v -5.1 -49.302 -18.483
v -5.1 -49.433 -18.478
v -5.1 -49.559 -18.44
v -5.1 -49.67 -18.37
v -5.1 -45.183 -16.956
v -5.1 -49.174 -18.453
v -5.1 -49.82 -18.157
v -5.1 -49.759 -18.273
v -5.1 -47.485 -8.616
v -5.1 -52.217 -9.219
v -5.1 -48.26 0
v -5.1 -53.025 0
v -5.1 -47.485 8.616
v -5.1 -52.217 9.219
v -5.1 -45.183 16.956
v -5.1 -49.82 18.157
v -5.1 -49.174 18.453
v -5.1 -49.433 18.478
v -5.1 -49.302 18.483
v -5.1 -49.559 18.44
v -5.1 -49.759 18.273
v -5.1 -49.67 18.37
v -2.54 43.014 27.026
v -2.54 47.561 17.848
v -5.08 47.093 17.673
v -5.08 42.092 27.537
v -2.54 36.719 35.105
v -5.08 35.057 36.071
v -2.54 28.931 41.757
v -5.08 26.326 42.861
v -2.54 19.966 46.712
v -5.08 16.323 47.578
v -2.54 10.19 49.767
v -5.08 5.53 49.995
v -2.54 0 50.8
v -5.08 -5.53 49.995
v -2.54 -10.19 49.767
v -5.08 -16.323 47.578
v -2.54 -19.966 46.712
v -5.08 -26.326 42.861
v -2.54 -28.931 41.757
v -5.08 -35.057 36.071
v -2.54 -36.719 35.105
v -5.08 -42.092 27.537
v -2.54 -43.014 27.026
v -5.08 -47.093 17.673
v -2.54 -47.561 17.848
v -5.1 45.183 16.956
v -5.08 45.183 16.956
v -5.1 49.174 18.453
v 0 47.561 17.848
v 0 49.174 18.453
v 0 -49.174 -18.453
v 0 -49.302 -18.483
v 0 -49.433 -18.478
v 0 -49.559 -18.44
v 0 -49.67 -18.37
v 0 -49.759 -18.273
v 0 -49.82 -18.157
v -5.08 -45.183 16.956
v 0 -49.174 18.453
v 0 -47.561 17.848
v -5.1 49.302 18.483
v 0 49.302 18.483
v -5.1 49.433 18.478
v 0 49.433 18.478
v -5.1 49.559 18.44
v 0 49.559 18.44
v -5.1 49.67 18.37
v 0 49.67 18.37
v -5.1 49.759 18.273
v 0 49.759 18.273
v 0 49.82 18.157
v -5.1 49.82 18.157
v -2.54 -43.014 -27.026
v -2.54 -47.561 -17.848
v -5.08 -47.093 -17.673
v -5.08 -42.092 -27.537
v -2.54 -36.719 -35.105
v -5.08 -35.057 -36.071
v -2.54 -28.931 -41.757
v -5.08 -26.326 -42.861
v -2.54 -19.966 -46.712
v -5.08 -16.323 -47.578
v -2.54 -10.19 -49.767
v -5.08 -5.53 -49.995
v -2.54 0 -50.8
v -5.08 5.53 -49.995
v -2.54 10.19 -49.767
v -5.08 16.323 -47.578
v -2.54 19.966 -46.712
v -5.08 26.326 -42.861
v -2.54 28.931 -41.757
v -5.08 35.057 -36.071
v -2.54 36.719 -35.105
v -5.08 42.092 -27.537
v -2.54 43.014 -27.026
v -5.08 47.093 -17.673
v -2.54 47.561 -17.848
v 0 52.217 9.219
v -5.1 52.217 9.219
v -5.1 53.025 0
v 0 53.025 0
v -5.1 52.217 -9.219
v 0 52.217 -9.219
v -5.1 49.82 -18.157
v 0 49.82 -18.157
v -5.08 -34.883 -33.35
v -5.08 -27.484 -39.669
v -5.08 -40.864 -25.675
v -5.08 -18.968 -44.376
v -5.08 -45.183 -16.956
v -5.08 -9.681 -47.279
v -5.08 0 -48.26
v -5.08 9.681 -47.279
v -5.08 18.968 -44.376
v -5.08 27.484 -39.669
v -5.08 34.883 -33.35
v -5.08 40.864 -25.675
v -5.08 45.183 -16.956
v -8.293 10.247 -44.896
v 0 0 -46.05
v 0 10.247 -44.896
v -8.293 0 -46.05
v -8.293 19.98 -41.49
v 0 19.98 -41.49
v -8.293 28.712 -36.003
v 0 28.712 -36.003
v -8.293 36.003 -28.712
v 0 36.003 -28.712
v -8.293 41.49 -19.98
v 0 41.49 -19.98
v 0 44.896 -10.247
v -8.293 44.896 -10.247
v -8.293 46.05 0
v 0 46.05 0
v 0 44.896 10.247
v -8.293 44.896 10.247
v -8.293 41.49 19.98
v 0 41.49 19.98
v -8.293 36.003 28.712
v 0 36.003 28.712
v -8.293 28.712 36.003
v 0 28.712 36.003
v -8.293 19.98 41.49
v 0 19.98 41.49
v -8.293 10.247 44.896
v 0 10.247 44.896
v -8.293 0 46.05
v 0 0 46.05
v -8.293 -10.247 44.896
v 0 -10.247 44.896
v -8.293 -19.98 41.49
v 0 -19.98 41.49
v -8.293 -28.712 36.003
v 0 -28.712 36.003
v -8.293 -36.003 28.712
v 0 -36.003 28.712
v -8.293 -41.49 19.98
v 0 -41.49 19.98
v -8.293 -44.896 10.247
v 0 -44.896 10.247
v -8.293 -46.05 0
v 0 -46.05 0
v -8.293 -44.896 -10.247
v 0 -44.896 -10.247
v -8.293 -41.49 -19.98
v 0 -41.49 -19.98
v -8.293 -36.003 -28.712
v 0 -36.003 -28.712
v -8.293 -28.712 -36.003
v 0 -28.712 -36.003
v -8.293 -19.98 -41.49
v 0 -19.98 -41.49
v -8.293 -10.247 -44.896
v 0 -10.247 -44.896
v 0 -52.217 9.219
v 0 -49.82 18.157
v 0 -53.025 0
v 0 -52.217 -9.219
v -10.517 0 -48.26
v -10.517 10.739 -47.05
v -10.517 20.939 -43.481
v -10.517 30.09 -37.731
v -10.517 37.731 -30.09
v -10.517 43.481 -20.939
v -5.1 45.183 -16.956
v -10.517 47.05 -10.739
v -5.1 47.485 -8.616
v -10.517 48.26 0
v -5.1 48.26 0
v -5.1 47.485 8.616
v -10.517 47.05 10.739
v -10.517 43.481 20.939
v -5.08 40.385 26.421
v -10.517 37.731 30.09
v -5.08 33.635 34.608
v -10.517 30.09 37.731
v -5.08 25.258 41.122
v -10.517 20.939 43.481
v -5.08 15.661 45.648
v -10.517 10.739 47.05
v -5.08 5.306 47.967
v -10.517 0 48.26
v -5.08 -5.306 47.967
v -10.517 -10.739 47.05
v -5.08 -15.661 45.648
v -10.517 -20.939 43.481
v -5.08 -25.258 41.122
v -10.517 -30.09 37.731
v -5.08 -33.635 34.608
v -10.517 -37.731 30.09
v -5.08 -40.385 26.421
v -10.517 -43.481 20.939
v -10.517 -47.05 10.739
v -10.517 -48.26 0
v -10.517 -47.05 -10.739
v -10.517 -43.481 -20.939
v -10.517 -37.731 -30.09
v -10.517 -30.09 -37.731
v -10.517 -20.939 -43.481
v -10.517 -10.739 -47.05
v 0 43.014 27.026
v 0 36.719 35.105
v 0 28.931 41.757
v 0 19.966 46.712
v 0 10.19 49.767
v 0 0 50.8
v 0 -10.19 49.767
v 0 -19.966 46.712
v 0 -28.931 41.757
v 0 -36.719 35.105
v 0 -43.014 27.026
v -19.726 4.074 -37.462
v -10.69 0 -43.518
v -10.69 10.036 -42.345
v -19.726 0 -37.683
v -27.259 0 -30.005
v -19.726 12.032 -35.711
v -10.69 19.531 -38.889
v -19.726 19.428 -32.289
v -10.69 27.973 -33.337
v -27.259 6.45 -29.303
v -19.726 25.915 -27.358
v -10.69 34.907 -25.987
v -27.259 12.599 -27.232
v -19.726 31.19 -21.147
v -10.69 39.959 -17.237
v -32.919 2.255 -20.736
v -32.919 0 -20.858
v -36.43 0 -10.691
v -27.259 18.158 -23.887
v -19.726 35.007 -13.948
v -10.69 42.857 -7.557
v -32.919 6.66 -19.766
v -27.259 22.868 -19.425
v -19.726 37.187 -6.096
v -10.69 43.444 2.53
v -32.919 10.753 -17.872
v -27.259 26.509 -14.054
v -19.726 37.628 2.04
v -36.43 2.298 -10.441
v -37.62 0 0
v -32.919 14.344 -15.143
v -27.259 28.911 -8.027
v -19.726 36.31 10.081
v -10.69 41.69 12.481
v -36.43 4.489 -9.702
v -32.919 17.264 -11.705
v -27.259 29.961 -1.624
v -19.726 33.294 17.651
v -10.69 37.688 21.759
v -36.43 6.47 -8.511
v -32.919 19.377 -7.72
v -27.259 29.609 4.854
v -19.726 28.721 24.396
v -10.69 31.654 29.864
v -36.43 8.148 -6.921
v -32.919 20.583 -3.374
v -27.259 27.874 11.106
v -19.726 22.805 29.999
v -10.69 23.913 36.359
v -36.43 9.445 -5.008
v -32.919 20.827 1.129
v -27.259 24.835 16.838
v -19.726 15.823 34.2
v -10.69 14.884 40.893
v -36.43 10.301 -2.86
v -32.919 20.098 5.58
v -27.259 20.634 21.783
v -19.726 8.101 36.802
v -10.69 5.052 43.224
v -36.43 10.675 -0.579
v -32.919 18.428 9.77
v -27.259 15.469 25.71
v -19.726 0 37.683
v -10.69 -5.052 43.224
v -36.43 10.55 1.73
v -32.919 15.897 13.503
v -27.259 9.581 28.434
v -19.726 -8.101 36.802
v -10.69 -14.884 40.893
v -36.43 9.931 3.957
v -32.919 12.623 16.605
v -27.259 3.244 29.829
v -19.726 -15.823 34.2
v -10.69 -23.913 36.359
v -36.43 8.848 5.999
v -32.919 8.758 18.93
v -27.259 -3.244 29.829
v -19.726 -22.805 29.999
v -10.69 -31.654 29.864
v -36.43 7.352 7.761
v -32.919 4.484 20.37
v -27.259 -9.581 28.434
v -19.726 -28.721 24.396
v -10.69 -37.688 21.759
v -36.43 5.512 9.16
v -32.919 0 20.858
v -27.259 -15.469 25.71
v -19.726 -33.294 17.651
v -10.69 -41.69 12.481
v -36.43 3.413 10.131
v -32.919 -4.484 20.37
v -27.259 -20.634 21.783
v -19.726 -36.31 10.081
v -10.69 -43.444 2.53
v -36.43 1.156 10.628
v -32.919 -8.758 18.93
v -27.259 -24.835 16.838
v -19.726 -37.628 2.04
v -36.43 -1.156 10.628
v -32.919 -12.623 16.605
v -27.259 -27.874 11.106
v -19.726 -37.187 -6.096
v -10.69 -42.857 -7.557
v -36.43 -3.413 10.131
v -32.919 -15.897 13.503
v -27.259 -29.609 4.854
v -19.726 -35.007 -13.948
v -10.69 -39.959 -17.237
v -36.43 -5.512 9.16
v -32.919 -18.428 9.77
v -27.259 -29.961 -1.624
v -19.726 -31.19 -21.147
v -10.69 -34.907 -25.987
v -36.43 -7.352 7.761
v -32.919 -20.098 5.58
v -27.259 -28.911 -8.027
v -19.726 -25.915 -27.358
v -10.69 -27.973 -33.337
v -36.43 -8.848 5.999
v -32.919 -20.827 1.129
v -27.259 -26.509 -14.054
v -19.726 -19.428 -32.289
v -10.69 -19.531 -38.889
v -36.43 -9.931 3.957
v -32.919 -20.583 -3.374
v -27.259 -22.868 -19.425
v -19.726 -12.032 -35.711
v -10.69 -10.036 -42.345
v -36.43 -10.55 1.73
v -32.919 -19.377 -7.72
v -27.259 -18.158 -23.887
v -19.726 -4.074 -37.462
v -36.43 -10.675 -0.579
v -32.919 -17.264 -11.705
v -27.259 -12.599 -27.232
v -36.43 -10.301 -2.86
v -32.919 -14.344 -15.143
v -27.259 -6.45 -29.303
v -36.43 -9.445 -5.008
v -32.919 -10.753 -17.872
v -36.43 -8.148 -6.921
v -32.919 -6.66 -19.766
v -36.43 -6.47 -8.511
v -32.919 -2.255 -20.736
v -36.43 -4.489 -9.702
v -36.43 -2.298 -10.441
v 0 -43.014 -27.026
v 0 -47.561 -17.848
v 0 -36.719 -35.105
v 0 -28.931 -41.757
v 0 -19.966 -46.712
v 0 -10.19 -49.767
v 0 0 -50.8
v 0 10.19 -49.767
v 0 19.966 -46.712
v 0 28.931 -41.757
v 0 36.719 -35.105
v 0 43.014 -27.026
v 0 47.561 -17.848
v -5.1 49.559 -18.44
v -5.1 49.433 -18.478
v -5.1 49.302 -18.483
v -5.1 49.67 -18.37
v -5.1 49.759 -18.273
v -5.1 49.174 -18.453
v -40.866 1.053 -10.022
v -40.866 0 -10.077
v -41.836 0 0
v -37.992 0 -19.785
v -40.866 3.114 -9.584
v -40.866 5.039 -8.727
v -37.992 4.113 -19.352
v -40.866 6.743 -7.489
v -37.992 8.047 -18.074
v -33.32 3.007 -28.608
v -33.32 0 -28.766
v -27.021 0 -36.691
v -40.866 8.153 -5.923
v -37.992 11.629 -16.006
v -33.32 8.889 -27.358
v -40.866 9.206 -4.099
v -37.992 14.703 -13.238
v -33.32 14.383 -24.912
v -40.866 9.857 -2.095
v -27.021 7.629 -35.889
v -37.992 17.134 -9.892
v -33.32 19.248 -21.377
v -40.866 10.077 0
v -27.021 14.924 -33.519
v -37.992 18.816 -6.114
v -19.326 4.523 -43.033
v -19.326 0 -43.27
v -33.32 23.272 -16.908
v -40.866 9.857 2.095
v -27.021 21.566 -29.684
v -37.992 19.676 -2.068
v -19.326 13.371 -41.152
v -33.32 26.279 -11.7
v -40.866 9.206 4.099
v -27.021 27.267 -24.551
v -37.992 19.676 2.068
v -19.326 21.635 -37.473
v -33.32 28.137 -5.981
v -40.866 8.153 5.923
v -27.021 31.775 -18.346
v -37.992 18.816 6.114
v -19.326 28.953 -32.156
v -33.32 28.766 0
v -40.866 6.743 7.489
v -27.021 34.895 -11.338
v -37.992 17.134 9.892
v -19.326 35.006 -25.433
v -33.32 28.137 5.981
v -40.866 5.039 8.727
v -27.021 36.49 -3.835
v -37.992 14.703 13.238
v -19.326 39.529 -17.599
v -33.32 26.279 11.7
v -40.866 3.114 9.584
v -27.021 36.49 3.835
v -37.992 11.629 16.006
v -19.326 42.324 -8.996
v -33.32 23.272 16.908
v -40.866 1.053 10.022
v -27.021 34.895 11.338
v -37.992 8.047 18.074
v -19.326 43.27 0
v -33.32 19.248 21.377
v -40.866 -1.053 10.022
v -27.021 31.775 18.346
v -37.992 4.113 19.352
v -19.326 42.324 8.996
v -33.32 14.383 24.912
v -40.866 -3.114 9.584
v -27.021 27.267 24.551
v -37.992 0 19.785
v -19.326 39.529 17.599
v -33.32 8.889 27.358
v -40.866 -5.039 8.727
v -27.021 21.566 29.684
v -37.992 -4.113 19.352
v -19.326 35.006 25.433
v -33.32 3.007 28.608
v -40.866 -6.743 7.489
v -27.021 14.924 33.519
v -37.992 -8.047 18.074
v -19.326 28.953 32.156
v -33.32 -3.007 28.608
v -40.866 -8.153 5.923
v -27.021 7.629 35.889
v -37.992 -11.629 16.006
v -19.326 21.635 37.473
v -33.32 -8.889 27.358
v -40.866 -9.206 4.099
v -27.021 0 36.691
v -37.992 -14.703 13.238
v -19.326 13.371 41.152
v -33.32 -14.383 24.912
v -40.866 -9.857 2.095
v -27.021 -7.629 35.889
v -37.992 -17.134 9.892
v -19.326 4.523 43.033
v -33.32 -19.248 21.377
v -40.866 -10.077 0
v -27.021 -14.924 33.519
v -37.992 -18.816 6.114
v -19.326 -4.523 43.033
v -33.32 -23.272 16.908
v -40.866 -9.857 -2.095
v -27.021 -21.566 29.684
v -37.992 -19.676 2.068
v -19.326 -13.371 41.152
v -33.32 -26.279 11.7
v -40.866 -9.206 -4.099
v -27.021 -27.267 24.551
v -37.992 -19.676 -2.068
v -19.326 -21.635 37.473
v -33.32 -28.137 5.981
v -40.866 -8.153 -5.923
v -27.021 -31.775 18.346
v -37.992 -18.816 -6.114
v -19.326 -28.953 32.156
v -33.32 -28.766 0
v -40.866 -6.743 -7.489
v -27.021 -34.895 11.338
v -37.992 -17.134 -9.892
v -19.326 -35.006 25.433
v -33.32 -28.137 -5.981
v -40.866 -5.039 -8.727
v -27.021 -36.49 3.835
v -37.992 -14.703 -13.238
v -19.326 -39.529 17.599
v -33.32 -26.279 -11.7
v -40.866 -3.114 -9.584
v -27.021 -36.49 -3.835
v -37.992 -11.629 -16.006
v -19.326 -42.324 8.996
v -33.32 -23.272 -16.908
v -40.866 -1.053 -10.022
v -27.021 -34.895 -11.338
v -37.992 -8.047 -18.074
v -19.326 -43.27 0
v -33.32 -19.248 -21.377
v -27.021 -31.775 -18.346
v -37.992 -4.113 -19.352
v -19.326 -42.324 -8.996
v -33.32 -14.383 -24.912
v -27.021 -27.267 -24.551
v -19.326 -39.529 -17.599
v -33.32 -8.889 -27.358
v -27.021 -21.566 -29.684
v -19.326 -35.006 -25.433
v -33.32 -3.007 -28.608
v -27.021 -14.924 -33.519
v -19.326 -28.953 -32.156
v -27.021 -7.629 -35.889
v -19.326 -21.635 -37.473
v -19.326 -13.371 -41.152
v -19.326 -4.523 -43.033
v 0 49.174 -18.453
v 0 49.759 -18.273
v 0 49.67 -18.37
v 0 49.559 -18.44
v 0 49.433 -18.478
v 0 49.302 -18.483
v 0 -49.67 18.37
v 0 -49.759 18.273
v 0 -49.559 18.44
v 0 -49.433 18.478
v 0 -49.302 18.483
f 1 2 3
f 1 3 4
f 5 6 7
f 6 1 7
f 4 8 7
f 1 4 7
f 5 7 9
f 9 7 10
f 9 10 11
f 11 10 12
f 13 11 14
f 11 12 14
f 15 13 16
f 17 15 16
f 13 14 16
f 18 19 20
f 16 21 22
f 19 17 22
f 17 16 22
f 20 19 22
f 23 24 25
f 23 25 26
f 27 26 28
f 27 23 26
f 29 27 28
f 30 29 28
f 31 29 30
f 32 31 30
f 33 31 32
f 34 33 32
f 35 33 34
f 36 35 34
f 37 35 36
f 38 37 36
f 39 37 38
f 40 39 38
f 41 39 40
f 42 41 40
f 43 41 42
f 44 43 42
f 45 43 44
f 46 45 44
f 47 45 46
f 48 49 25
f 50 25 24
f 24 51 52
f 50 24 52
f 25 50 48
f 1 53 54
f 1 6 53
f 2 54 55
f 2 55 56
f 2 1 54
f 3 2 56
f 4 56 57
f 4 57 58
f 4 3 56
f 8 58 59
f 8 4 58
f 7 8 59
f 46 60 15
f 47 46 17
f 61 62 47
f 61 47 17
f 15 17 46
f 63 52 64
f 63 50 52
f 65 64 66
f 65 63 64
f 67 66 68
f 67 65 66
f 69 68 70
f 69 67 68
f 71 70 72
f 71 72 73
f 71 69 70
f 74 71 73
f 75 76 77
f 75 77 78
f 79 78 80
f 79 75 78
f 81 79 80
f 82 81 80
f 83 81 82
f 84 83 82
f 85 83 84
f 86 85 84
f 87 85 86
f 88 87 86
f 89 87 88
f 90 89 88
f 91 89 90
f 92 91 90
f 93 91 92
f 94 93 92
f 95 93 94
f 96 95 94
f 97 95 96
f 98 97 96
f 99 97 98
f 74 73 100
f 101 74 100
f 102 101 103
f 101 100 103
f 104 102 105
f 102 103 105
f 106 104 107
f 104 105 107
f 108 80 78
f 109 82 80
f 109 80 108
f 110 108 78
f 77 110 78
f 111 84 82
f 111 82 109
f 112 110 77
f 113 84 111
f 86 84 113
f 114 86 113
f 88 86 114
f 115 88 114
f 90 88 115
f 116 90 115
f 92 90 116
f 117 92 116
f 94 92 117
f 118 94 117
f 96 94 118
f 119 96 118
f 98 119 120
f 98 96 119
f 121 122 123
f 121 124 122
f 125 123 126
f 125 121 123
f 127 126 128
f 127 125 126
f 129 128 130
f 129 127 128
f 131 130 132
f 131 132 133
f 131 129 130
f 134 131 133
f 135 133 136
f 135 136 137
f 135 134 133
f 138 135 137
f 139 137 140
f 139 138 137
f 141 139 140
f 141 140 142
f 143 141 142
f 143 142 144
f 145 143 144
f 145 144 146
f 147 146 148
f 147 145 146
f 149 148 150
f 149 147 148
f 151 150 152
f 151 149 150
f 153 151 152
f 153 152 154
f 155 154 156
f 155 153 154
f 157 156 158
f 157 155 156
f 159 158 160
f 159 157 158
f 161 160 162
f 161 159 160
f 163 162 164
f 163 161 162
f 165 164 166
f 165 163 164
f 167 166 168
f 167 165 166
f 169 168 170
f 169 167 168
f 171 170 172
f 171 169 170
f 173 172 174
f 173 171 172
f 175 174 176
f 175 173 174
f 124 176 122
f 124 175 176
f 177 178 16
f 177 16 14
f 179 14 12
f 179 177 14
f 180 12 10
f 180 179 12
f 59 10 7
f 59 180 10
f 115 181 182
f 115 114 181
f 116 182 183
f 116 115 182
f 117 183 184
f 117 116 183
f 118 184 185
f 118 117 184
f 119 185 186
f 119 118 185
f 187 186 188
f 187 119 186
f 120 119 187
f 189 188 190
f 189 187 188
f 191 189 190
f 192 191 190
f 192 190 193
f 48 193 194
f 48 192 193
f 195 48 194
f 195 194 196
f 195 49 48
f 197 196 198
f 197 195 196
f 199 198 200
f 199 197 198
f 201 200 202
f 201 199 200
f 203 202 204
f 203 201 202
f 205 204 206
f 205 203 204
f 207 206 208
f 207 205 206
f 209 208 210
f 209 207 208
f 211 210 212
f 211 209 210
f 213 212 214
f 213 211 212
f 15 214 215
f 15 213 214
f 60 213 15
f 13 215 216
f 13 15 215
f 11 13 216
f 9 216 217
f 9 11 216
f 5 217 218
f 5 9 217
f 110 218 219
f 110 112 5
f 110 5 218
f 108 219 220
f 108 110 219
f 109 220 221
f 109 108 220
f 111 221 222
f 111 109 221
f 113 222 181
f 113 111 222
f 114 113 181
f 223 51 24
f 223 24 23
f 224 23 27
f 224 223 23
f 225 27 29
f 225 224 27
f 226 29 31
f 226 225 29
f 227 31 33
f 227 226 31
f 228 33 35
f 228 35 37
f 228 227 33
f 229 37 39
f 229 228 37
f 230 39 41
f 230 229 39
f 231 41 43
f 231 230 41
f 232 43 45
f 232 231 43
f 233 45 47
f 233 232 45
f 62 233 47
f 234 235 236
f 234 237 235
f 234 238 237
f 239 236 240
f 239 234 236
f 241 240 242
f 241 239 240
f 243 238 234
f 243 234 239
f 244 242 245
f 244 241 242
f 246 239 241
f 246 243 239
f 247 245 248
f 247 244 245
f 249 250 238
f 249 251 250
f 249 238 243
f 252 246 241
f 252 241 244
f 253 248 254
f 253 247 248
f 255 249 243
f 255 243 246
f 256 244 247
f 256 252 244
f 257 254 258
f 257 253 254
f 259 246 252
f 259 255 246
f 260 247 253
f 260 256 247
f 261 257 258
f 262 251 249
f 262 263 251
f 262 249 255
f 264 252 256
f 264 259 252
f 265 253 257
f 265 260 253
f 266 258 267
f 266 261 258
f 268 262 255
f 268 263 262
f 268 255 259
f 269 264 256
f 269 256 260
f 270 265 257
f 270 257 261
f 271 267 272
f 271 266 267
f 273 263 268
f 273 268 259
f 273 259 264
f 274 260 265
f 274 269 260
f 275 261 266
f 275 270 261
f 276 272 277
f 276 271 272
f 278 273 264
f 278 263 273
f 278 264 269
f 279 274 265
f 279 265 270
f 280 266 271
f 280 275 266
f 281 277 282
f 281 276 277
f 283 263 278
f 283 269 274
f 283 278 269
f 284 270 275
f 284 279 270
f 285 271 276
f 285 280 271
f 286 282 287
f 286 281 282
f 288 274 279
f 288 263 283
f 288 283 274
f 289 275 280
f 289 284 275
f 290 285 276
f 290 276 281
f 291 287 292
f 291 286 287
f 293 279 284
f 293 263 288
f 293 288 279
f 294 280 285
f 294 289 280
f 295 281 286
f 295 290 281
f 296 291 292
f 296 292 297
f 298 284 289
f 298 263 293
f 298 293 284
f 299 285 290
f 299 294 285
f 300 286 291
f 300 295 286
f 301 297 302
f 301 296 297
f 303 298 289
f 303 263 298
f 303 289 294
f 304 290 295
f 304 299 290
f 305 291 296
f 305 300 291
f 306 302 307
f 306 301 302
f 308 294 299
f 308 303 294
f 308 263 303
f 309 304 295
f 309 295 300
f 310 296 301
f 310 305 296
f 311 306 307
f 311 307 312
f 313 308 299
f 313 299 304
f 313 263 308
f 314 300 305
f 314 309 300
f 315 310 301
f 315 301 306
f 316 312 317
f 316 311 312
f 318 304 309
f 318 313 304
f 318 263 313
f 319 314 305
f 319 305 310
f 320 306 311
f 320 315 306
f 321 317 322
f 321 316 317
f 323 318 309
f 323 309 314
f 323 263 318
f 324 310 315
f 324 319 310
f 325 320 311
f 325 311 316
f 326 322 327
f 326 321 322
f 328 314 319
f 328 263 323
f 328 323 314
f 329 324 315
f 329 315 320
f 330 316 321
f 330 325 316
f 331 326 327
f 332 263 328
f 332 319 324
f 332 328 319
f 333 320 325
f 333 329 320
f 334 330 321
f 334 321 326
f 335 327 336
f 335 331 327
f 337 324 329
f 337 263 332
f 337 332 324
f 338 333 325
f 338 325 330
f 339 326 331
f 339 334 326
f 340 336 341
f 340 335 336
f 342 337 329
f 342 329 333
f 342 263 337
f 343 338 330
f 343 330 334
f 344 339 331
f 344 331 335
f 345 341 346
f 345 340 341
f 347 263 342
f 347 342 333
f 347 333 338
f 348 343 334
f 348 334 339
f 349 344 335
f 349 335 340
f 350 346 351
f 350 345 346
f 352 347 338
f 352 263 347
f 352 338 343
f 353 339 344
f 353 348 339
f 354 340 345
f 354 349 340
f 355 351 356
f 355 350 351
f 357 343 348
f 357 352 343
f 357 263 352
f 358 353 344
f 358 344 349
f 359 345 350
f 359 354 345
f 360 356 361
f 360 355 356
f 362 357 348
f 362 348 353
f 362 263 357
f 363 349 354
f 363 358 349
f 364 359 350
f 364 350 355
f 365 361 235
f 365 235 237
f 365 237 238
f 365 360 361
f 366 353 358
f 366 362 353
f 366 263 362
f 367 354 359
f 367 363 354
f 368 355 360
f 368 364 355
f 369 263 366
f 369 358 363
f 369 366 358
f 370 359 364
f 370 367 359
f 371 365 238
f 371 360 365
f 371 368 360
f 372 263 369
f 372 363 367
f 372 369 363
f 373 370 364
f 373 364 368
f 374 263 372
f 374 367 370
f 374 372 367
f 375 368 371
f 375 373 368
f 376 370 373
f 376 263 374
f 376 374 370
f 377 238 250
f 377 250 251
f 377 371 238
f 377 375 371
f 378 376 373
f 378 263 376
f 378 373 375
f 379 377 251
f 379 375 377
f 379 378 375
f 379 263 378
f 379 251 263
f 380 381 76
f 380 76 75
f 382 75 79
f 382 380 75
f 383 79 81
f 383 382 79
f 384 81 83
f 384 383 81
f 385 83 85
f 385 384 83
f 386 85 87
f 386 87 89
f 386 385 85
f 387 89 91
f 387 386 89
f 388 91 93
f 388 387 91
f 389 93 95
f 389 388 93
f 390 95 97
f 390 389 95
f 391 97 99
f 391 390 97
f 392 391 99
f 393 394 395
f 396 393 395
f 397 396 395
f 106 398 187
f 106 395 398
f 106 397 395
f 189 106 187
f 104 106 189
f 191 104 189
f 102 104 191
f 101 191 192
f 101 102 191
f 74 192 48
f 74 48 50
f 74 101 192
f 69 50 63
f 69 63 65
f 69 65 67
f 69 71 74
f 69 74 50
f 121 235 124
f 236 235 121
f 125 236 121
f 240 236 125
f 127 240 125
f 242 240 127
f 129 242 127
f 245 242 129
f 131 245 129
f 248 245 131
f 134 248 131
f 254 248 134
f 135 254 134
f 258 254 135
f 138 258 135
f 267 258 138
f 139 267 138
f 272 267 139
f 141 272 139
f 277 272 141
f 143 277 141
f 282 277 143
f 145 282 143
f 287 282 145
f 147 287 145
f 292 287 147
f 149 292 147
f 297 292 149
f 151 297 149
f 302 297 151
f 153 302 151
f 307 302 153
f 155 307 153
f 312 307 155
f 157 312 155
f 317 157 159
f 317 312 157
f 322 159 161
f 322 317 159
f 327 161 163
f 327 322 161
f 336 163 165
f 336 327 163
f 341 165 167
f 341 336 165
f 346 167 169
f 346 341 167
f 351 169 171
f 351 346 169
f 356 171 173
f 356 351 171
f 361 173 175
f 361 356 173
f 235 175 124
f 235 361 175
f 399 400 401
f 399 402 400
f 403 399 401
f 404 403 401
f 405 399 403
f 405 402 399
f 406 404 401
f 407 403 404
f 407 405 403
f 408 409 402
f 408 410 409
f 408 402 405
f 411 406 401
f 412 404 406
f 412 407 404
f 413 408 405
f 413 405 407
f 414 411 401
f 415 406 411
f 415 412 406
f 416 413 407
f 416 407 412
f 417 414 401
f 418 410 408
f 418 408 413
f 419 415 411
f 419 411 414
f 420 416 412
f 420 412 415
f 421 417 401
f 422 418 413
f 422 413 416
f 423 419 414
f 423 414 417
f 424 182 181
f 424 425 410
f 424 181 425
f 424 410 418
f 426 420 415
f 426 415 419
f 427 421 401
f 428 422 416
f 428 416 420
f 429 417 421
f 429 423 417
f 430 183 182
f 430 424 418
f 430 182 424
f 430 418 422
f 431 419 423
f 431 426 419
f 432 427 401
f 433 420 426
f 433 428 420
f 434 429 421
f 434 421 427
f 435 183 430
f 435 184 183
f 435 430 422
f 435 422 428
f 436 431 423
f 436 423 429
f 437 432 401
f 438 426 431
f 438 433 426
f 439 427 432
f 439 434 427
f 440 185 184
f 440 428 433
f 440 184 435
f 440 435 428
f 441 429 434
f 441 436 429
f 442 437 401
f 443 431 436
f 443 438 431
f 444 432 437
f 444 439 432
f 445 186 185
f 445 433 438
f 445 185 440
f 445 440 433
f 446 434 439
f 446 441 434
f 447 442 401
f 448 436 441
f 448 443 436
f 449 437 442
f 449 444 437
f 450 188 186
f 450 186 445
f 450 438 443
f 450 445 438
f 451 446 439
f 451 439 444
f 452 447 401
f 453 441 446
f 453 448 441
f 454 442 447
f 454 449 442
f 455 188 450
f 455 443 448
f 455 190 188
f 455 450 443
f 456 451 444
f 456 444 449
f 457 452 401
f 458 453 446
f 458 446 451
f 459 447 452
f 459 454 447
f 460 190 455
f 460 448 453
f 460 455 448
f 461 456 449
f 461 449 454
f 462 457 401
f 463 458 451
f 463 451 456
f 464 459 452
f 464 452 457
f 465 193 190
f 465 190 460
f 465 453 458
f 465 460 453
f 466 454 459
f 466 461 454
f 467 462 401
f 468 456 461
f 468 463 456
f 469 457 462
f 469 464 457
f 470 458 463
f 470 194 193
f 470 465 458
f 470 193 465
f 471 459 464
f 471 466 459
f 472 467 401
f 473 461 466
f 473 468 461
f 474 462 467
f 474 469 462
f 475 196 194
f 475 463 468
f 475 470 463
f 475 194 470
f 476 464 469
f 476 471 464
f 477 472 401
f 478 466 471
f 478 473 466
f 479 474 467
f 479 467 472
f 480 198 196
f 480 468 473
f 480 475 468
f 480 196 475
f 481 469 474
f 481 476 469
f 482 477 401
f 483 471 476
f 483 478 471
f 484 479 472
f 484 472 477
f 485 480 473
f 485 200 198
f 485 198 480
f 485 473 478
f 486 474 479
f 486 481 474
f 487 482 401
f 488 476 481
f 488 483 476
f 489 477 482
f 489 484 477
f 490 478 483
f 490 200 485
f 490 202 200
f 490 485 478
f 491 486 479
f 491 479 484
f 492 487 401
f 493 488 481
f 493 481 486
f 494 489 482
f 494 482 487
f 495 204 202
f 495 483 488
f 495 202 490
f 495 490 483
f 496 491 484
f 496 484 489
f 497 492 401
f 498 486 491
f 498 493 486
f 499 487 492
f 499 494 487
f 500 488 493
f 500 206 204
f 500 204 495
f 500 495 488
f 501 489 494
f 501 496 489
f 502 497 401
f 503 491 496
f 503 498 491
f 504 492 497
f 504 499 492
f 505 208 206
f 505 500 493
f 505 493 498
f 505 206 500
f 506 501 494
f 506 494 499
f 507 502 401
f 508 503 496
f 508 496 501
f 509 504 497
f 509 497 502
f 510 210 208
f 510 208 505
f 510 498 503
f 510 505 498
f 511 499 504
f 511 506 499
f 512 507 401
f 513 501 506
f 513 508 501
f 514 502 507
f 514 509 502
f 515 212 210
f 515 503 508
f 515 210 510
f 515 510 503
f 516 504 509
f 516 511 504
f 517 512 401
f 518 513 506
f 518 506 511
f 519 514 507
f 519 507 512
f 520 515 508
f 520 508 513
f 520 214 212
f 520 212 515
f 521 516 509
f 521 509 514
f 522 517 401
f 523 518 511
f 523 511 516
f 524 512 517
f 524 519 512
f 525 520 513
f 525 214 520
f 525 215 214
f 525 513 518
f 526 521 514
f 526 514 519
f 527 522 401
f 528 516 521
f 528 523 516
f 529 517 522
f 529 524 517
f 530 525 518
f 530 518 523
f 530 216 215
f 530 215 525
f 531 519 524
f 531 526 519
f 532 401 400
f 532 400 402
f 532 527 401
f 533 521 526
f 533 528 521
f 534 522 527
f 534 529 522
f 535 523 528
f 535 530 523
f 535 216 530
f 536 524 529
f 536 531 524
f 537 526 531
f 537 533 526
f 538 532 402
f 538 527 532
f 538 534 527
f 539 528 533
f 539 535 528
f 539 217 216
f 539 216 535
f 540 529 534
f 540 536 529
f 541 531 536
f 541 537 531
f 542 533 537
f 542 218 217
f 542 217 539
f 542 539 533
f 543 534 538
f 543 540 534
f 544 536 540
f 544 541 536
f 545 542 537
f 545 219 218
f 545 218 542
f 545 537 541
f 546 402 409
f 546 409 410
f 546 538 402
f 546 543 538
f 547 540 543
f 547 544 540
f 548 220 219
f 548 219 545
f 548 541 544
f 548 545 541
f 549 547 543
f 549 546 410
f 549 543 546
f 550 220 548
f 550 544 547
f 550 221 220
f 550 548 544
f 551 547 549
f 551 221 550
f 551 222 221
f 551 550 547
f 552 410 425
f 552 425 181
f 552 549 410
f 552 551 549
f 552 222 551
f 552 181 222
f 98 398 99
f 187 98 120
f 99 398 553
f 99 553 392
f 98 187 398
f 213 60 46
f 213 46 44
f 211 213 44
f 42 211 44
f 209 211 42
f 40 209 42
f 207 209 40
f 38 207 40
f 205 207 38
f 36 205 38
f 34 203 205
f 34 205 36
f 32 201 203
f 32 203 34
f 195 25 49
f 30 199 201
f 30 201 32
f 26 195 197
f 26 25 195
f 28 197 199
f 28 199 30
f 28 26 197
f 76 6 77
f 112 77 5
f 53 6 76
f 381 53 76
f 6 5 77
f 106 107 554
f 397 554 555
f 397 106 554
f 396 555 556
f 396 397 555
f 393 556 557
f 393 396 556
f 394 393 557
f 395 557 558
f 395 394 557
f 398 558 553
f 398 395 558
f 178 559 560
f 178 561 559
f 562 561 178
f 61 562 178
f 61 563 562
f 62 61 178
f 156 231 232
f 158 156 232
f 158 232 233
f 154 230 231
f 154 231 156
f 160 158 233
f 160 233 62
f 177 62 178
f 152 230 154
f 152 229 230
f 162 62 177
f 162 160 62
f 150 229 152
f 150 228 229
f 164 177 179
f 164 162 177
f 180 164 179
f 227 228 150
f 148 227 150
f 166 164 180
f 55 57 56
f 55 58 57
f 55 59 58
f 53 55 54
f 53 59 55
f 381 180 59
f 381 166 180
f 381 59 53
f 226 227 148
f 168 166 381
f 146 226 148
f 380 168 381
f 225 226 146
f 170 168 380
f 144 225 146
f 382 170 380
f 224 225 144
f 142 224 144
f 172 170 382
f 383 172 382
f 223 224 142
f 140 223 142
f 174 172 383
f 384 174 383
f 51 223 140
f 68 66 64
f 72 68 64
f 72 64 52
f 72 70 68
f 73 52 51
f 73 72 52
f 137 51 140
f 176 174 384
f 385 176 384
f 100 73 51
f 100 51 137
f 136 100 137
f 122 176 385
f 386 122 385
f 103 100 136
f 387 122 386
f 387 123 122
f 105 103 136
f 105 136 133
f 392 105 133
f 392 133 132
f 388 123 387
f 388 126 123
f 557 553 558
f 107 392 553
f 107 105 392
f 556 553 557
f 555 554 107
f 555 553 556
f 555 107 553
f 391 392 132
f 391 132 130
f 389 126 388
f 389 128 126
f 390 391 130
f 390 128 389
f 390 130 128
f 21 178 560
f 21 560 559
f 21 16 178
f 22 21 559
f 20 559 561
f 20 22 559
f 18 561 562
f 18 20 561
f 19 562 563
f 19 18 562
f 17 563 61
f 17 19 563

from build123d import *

# Parameters (mm, degrees)
BOSS_EXTRUDE2_DEPTH  = 5.1
FILLET1_R            = 0.5
FILLET1_OF_MIRROR1_R = 0.5


with BuildPart() as part:
    # Sketch1 → Revolve1 (revolve)
    with BuildSketch(Plane(origin=(0, 0, 0), x_dir=(1, 0, 0), z_dir=(0, 1, 0))):
        with BuildLine():
            Line((0, 46.0502), (-8.2931, 46.0502))
            Line((-8.2931, 46.0502), (-10.689645397, 43.517785789))
            ThreePointArc((-10.689645397, 43.517785789), (-30.34289905, 25.58829166), (-37.620018589, 0))
            Line((-37.620018589, 0), (-41.835987512, 0))
            ThreePointArc((-41.835987512, 0), (-33.320163486, 28.765773565), (-10.517441644, 48.26))
            Line((-10.517441644, 48.26), (-5.08, 48.26))
            Line((-5.08, 48.26), (-5.08, 50.3))
            Line((-5.08, 50.3), (-2.54, 50.8))
            Line((-2.54, 50.8), (0, 50.8))
            Line((0, 50.8), (0, 46.0502))
        make_face()
    revolve(axis=Axis((2.224514483, 0, 0), (1, 0, 0)))

    # Sketch3 → Boss-Extrude2 (add)
    with BuildSketch(Plane(origin=(0, 0, 0), x_dir=(0, 0, -1), z_dir=(1, 0, 0))):
        with BuildLine():
            Line((-16.873281471, 44.963240513), (-18.63, 49.644473257))
            ThreePointArc((-18.63, 49.644473257), (0, 53.025), (18.63, 49.644473257))
            Line((18.63, 49.644473257), (16.873281471, 44.963240513))
            ThreePointArc((16.873281471, 44.963240513), (0, 48.025), (-16.873281471, 44.963240513))
        make_face()
    boss_extrude2 = extrude(amount=-BOSS_EXTRUDE2_DEPTH)

    # Fillet1
    fillet1_edges = [part.edges().sort_by_distance(p)[0] for p in [
        (-2.55, 49.644473257, -18.63),
        (-2.55, 49.644473257, 18.63),
    ]]
    fillet(fillet1_edges, radius=FILLET1_R)

    # Mirror1: Boss-Extrude2 across plane
    add(boss_extrude2.mirror(Plane.ZX))

    # Fillet1 of Mirror1
    fillet1_of_mirror1_edges = [part.edges().sort_by_distance(p)[0] for p in [
        (-2.55, -49.644473257, -18.63),
        (-2.55, -49.644473257, 18.63),
    ]]
    fillet(fillet1_of_mirror1_edges, radius=FILLET1_OF_MIRROR1_R)


solid = part.part
